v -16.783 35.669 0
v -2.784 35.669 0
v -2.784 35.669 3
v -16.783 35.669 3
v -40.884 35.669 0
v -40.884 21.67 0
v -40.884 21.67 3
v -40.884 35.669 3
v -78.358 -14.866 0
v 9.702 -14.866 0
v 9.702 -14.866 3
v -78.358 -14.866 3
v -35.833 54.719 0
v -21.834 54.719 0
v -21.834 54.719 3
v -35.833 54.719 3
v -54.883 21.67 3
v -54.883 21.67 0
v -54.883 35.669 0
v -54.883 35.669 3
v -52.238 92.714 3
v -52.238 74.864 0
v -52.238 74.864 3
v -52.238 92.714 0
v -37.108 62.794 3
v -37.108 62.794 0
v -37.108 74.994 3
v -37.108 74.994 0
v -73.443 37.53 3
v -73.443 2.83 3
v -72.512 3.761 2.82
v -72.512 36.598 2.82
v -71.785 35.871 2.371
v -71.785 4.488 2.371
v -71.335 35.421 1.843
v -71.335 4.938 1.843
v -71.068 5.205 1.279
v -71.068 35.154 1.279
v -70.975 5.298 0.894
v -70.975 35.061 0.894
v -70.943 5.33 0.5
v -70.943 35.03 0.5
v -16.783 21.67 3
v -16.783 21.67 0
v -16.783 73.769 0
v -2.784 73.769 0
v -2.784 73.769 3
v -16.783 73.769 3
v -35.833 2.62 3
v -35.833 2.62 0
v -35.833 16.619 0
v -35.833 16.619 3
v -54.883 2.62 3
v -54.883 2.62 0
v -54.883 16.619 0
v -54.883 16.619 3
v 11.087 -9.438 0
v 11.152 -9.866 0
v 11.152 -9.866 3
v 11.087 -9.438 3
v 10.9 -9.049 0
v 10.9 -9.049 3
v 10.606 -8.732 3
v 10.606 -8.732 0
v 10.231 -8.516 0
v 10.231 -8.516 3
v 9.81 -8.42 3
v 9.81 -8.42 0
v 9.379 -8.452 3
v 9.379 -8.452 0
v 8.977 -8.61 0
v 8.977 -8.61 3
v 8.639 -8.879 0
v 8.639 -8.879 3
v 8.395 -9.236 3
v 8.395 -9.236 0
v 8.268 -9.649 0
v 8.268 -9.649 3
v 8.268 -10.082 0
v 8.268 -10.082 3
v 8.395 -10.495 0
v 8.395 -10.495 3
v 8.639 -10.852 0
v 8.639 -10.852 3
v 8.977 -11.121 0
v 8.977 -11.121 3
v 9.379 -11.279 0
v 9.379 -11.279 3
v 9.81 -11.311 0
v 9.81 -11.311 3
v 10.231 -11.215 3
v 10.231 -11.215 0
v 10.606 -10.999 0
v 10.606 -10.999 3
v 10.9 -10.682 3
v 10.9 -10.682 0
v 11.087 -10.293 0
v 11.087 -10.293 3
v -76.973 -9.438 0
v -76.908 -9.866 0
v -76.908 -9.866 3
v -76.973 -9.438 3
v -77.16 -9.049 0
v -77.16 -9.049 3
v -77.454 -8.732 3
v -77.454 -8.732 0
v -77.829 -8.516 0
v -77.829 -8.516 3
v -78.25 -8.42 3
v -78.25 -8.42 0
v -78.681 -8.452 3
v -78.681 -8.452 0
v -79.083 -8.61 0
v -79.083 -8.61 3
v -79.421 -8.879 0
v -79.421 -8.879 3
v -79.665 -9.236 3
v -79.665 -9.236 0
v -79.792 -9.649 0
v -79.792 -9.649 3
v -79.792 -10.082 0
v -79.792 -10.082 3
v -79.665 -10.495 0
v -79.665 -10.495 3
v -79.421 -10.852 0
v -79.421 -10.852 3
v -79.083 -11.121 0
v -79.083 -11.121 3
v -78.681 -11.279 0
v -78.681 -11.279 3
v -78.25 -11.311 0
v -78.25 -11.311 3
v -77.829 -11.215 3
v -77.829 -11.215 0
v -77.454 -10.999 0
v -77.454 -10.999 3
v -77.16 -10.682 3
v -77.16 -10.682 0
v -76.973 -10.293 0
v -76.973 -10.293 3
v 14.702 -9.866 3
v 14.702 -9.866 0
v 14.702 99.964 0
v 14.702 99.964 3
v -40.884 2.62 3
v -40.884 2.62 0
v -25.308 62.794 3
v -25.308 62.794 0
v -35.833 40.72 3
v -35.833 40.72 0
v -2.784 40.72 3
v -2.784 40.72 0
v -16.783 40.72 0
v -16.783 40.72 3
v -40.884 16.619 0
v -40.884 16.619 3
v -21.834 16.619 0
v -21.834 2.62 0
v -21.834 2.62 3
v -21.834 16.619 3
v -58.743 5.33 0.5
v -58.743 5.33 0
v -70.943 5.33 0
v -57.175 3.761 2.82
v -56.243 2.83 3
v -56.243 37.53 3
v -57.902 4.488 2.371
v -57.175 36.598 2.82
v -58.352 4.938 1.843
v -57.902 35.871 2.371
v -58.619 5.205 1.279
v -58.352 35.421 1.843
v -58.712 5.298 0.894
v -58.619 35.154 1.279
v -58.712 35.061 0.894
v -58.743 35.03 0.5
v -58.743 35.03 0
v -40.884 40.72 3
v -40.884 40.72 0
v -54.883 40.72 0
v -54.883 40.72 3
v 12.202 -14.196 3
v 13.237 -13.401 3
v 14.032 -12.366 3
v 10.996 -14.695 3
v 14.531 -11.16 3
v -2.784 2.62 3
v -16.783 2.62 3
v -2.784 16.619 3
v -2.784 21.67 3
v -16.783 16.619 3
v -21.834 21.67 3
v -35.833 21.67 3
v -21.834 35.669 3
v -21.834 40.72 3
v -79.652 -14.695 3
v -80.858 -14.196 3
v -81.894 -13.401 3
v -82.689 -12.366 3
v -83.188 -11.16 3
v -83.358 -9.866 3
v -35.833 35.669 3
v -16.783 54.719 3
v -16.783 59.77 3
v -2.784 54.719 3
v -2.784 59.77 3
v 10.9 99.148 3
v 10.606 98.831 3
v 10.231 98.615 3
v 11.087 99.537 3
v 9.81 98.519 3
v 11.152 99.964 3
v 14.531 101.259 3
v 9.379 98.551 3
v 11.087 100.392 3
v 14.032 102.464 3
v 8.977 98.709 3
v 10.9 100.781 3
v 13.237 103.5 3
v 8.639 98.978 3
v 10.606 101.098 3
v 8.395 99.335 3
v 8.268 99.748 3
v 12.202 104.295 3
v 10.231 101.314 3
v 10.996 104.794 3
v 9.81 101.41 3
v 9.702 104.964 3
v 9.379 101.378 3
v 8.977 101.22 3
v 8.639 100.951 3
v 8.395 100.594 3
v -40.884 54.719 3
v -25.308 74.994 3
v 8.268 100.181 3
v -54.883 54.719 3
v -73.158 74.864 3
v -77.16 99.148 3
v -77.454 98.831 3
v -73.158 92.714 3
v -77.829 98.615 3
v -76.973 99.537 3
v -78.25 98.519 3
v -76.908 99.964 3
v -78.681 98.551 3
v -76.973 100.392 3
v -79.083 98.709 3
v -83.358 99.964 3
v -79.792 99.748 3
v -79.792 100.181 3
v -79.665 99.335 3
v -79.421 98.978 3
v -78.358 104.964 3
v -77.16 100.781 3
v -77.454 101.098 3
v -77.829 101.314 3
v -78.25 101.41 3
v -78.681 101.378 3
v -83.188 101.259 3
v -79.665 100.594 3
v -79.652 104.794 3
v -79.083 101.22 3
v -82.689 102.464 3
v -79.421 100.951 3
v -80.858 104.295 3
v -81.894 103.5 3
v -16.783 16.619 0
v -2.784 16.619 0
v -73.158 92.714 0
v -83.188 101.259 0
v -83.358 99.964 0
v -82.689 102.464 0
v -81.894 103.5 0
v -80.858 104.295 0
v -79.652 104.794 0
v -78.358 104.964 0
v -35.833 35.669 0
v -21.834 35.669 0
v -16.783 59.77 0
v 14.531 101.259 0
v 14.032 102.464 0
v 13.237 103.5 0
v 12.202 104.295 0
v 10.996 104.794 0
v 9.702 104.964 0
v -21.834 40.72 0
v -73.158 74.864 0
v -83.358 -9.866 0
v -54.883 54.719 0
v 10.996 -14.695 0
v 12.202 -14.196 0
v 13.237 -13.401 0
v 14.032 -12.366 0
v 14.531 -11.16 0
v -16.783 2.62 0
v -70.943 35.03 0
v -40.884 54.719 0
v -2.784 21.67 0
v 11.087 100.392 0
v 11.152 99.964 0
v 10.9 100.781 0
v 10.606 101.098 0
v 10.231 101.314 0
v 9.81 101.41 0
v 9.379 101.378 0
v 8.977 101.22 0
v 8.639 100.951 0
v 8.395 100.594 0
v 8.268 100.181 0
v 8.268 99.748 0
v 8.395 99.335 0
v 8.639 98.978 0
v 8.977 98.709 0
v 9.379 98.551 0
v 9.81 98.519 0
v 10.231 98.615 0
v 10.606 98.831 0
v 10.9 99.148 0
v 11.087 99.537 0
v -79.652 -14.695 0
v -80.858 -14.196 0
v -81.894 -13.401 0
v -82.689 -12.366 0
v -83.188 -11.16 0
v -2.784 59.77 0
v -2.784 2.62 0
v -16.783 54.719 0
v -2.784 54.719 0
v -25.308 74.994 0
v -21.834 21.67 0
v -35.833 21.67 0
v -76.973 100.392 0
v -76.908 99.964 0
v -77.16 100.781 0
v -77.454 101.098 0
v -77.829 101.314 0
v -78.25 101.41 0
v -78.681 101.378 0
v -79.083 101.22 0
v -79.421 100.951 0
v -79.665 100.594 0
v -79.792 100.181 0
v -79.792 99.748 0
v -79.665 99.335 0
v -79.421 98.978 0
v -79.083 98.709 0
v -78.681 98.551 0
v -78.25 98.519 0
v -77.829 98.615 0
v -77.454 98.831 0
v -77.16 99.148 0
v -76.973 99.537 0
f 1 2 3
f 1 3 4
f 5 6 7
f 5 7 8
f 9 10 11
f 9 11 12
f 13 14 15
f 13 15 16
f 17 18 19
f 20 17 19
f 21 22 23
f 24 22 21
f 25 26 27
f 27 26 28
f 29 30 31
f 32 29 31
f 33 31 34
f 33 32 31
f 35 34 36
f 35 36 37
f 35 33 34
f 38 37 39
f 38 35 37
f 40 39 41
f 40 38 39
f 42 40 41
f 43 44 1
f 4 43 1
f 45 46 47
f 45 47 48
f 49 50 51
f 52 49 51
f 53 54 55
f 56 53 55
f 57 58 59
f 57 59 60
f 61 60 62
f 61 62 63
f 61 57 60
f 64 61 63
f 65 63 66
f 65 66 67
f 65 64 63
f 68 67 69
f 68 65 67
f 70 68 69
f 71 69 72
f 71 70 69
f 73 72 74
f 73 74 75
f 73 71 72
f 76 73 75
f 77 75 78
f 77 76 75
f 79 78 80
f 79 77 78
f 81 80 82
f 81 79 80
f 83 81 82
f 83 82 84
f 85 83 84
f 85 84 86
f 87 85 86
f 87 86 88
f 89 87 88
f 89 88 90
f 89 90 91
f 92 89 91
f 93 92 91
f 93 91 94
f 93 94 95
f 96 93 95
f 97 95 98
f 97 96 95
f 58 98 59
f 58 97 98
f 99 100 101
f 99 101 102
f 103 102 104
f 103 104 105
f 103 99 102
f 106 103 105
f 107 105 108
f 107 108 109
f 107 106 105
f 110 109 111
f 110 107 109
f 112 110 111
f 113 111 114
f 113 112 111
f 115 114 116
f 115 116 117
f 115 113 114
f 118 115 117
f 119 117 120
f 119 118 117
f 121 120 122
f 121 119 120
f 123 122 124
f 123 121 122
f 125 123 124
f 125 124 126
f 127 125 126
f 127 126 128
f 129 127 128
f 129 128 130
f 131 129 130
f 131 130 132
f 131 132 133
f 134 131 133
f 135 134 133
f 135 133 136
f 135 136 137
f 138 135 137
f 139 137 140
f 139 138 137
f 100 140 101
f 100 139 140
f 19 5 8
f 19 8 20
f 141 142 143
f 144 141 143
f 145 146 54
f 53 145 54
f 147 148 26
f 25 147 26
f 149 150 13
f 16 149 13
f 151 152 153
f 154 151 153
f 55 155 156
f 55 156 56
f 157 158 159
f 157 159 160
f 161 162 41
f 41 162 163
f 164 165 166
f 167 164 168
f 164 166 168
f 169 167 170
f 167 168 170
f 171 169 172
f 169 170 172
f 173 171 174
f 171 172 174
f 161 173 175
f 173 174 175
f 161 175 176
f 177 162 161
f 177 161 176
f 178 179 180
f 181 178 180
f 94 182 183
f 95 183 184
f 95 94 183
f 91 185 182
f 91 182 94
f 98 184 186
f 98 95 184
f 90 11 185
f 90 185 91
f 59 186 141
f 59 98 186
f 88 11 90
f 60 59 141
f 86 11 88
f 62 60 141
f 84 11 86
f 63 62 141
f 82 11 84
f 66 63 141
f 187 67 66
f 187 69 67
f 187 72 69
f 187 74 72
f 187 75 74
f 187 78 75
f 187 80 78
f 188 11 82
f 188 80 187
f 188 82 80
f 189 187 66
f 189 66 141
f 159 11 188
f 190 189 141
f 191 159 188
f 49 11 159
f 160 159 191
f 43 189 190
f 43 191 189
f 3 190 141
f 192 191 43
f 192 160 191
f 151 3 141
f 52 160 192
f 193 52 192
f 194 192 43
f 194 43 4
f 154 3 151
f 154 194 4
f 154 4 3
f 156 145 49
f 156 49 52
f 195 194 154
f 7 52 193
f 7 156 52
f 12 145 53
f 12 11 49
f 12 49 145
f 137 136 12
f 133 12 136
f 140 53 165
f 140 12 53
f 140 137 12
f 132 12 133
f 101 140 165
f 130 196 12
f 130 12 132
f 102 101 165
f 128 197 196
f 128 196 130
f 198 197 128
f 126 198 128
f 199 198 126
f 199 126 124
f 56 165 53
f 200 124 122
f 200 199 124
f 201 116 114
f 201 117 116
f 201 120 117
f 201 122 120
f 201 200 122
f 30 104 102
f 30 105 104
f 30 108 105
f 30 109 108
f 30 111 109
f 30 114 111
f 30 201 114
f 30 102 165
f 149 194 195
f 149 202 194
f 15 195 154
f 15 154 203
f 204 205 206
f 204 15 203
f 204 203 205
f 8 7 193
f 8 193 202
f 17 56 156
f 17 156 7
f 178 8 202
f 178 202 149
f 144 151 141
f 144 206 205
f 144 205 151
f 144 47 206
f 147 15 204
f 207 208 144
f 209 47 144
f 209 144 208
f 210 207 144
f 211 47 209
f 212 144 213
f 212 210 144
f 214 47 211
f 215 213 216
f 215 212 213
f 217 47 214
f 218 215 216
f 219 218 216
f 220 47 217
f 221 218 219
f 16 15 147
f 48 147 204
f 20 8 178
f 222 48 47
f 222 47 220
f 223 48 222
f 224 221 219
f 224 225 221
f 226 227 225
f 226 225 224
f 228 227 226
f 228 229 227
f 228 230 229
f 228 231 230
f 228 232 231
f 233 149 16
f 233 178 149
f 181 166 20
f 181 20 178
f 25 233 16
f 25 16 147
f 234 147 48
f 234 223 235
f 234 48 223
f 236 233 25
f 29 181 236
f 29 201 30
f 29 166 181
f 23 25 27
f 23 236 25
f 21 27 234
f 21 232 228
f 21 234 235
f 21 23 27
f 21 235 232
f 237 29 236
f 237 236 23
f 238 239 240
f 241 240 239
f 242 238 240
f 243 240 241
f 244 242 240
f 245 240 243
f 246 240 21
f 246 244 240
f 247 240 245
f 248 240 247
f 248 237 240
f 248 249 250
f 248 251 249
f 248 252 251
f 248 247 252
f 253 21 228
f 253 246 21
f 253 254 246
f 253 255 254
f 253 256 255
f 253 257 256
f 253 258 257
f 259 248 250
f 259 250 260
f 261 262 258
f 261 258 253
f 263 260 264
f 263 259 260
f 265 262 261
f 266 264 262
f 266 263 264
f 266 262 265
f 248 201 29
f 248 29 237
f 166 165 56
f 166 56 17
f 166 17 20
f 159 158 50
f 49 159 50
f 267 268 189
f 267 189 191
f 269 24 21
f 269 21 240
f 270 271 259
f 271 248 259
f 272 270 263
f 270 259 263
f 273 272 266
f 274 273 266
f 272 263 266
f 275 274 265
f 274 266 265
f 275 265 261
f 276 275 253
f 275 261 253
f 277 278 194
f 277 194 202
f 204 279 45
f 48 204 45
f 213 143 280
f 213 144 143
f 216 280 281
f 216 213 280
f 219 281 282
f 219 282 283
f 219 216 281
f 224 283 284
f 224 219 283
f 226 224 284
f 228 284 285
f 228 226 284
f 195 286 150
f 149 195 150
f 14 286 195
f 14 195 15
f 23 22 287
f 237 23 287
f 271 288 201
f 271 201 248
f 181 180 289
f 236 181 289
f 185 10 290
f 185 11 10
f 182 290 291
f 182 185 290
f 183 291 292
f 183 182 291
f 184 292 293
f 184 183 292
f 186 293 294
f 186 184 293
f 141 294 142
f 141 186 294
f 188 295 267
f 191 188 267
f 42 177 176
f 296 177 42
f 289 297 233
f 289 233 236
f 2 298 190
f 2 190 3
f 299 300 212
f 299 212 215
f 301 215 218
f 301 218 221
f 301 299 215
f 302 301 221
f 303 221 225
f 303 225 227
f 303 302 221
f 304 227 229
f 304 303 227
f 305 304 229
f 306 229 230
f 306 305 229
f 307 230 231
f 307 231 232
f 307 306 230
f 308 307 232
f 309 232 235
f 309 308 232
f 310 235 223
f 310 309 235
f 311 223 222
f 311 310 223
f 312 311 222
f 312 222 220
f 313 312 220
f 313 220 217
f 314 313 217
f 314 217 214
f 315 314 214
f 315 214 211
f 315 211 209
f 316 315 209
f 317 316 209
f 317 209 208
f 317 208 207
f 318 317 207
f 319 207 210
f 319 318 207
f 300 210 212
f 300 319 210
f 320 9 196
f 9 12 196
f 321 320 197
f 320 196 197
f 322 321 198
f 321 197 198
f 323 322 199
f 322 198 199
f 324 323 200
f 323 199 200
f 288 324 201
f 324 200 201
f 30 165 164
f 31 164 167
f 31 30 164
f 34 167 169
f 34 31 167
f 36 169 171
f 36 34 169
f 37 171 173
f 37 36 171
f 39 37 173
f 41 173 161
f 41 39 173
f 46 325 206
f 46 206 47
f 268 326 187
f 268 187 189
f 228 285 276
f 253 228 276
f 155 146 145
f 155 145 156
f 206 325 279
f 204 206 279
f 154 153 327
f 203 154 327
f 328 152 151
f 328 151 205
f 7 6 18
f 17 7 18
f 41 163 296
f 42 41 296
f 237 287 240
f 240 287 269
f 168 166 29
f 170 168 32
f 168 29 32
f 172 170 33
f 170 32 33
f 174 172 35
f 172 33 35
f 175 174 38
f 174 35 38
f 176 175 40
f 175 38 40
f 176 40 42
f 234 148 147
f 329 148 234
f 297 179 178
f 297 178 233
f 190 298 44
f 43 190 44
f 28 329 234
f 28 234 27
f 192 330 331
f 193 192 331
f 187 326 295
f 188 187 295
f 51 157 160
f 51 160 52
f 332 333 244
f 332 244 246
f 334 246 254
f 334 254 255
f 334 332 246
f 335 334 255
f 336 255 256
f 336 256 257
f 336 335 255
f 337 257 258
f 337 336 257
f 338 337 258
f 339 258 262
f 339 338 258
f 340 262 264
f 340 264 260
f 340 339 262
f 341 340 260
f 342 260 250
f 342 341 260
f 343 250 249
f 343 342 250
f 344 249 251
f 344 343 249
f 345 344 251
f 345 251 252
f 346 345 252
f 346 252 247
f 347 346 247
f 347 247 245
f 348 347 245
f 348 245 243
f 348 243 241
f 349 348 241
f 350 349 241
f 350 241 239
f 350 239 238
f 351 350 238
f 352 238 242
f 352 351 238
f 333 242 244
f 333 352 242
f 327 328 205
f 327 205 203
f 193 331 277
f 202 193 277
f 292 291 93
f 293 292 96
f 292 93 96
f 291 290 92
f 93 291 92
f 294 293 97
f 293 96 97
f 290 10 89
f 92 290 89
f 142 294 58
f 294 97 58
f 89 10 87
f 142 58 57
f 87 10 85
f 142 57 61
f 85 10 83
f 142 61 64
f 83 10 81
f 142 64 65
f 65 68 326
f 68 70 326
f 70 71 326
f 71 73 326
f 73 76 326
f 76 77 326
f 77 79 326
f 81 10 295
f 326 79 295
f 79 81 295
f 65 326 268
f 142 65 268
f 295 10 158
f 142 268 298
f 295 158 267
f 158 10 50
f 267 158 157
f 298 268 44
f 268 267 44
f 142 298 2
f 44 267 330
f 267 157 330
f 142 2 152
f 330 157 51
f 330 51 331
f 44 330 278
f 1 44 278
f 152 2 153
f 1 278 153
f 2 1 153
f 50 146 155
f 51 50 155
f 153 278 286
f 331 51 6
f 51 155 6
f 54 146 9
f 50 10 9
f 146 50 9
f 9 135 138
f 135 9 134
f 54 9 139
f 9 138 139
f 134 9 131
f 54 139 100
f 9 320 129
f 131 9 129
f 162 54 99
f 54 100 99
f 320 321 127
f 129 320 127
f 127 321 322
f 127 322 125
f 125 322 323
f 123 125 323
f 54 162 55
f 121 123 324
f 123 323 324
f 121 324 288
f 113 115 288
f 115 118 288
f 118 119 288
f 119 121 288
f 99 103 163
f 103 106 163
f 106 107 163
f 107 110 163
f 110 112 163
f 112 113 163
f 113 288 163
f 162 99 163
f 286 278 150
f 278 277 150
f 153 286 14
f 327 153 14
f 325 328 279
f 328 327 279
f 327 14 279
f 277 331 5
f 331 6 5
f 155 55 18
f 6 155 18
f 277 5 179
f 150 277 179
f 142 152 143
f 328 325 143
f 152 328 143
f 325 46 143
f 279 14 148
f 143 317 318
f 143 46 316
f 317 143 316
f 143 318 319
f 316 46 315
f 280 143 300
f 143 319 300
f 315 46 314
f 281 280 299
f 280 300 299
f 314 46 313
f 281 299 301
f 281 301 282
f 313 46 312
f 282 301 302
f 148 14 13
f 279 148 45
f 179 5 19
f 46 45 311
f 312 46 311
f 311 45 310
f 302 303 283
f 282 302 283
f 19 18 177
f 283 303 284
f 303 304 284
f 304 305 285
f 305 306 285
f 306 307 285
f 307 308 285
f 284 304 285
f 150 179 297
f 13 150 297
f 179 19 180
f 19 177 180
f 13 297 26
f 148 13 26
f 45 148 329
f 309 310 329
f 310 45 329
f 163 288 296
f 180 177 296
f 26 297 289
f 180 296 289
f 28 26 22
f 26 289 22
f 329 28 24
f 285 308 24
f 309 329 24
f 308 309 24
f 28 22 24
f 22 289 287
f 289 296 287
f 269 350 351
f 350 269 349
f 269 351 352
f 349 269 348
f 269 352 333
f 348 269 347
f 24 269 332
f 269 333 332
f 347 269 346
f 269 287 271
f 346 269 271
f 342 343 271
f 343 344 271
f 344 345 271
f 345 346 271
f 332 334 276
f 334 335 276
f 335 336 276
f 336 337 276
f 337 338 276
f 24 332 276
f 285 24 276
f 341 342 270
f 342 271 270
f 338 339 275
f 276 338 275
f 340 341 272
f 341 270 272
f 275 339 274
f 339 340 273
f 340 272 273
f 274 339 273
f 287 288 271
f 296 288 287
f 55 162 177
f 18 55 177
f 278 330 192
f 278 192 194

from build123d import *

# Parameters (mm, degrees)
SKETCH6_W           = 119.83
SKETCH6_H           = 98.06
SKETCH6_R           = 1.45
SKETCH6_W_2         = 12.2
SKETCH6_H_2         = 11.8
SKETCH6_W_3         = 13.99955
SKETCH6_H_3         = 13.99955
SKETCH6_W_4         = 29.7
SKETCH6_H_4         = 12.2
SKETCH6_W_5         = 17.85
SKETCH6_H_5         = 20.92
BOSS_EXTRUDE1_DEPTH = 3
FILLET1_R           = 5
FILLET2_R           = 2.5


with BuildPart() as part:
    # Sketch6 → Boss-Extrude1 (new body)
    with BuildSketch(Plane(origin=(0, 0, 0), x_dir=(0, 1, 0), z_dir=(0, 0, 1))):
        with Locations((45.049475, 34.328375)):
            Rectangle(SKETCH6_W, SKETCH6_H)
        with Locations(Location((-9.865525, 78.358375, 0), (0, 0, 270))):
            Circle(SKETCH6_R, mode=Mode.SUBTRACT)
        with Locations(Location((-9.865525, -9.701625, 0), (0, 0, 270))):
            Circle(SKETCH6_R, mode=Mode.SUBTRACT)
        with Locations(Location((99.964475, -9.701625, 0), (0, 0, 270))):
            Circle(SKETCH6_R, mode=Mode.SUBTRACT)
        with Locations(Location((99.964475, 78.358375, 0), (0, 0, 270))):
            Circle(SKETCH6_R, mode=Mode.SUBTRACT)
        with Locations((68.894475, 31.208375)):
            Rectangle(SKETCH6_W_2, SKETCH6_H_2, mode=Mode.SUBTRACT)
        with Locations((28.669475, 28.833375)):
            Rectangle(SKETCH6_W_3, SKETCH6_H_3, mode=Mode.SUBTRACT)
        with Locations((47.719475, 28.833375)):
            Rectangle(SKETCH6_W_3, SKETCH6_H_3, mode=Mode.SUBTRACT)
        with Locations((66.769475, 9.783415)):
            Rectangle(SKETCH6_W_3, SKETCH6_H_3, mode=Mode.SUBTRACT)
        with Locations((47.719475, 9.783415)):
            Rectangle(SKETCH6_W_3, SKETCH6_H_3, mode=Mode.SUBTRACT)
        with Locations((28.669475, 9.783415)):
            Rectangle(SKETCH6_W_3, SKETCH6_H_3, mode=Mode.SUBTRACT)
        with Locations((9.619425, 9.783415)):
            Rectangle(SKETCH6_W_3, SKETCH6_H_3, mode=Mode.SUBTRACT)
        with Locations((9.619425, 28.833375)):
            Rectangle(SKETCH6_W_3, SKETCH6_H_3, mode=Mode.SUBTRACT)
        with Locations((9.619425, 47.883575)):
            Rectangle(SKETCH6_W_3, SKETCH6_H_3, mode=Mode.SUBTRACT)
        with Locations((28.669475, 47.883575)):
            Rectangle(SKETCH6_W_3, SKETCH6_H_3, mode=Mode.SUBTRACT)
        with Locations((47.719475, 47.883575)):
            Rectangle(SKETCH6_W_3, SKETCH6_H_3, mode=Mode.SUBTRACT)
        with Locations((20.17965, 64.843375)):
            Rectangle(SKETCH6_W_4, SKETCH6_H_4, mode=Mode.SUBTRACT)
        with Locations((83.789475, 62.698375)):
            Rectangle(SKETCH6_W_5, SKETCH6_H_5, mode=Mode.SUBTRACT)
    extrude(amount=BOSS_EXTRUDE1_DEPTH)

    # Fillet1
    fillet1_edges = [part.edges().sort_by_distance(p)[0] for p in [
        (-83.358375, 104.964475, 1.5),
        (14.701625, 104.964475, 1.5),
        (14.701625, -14.865525, 1.5),
        (-83.358375, -14.865525, 1.5),
    ]]
    fillet(fillet1_edges, radius=FILLET1_R)

    # Fillet2
    fillet2_edges = [part.edges().sort_by_distance(p)[0] for p in [
        (-64.843375, 5.32965, 3),
        (-58.743375, 20.17965, 3),
        (-64.843375, 35.02965, 3),
        (-70.943375, 20.17965, 3),
    ]]
    fillet(fillet2_edges, radius=FILLET2_R)


solid = part.part
